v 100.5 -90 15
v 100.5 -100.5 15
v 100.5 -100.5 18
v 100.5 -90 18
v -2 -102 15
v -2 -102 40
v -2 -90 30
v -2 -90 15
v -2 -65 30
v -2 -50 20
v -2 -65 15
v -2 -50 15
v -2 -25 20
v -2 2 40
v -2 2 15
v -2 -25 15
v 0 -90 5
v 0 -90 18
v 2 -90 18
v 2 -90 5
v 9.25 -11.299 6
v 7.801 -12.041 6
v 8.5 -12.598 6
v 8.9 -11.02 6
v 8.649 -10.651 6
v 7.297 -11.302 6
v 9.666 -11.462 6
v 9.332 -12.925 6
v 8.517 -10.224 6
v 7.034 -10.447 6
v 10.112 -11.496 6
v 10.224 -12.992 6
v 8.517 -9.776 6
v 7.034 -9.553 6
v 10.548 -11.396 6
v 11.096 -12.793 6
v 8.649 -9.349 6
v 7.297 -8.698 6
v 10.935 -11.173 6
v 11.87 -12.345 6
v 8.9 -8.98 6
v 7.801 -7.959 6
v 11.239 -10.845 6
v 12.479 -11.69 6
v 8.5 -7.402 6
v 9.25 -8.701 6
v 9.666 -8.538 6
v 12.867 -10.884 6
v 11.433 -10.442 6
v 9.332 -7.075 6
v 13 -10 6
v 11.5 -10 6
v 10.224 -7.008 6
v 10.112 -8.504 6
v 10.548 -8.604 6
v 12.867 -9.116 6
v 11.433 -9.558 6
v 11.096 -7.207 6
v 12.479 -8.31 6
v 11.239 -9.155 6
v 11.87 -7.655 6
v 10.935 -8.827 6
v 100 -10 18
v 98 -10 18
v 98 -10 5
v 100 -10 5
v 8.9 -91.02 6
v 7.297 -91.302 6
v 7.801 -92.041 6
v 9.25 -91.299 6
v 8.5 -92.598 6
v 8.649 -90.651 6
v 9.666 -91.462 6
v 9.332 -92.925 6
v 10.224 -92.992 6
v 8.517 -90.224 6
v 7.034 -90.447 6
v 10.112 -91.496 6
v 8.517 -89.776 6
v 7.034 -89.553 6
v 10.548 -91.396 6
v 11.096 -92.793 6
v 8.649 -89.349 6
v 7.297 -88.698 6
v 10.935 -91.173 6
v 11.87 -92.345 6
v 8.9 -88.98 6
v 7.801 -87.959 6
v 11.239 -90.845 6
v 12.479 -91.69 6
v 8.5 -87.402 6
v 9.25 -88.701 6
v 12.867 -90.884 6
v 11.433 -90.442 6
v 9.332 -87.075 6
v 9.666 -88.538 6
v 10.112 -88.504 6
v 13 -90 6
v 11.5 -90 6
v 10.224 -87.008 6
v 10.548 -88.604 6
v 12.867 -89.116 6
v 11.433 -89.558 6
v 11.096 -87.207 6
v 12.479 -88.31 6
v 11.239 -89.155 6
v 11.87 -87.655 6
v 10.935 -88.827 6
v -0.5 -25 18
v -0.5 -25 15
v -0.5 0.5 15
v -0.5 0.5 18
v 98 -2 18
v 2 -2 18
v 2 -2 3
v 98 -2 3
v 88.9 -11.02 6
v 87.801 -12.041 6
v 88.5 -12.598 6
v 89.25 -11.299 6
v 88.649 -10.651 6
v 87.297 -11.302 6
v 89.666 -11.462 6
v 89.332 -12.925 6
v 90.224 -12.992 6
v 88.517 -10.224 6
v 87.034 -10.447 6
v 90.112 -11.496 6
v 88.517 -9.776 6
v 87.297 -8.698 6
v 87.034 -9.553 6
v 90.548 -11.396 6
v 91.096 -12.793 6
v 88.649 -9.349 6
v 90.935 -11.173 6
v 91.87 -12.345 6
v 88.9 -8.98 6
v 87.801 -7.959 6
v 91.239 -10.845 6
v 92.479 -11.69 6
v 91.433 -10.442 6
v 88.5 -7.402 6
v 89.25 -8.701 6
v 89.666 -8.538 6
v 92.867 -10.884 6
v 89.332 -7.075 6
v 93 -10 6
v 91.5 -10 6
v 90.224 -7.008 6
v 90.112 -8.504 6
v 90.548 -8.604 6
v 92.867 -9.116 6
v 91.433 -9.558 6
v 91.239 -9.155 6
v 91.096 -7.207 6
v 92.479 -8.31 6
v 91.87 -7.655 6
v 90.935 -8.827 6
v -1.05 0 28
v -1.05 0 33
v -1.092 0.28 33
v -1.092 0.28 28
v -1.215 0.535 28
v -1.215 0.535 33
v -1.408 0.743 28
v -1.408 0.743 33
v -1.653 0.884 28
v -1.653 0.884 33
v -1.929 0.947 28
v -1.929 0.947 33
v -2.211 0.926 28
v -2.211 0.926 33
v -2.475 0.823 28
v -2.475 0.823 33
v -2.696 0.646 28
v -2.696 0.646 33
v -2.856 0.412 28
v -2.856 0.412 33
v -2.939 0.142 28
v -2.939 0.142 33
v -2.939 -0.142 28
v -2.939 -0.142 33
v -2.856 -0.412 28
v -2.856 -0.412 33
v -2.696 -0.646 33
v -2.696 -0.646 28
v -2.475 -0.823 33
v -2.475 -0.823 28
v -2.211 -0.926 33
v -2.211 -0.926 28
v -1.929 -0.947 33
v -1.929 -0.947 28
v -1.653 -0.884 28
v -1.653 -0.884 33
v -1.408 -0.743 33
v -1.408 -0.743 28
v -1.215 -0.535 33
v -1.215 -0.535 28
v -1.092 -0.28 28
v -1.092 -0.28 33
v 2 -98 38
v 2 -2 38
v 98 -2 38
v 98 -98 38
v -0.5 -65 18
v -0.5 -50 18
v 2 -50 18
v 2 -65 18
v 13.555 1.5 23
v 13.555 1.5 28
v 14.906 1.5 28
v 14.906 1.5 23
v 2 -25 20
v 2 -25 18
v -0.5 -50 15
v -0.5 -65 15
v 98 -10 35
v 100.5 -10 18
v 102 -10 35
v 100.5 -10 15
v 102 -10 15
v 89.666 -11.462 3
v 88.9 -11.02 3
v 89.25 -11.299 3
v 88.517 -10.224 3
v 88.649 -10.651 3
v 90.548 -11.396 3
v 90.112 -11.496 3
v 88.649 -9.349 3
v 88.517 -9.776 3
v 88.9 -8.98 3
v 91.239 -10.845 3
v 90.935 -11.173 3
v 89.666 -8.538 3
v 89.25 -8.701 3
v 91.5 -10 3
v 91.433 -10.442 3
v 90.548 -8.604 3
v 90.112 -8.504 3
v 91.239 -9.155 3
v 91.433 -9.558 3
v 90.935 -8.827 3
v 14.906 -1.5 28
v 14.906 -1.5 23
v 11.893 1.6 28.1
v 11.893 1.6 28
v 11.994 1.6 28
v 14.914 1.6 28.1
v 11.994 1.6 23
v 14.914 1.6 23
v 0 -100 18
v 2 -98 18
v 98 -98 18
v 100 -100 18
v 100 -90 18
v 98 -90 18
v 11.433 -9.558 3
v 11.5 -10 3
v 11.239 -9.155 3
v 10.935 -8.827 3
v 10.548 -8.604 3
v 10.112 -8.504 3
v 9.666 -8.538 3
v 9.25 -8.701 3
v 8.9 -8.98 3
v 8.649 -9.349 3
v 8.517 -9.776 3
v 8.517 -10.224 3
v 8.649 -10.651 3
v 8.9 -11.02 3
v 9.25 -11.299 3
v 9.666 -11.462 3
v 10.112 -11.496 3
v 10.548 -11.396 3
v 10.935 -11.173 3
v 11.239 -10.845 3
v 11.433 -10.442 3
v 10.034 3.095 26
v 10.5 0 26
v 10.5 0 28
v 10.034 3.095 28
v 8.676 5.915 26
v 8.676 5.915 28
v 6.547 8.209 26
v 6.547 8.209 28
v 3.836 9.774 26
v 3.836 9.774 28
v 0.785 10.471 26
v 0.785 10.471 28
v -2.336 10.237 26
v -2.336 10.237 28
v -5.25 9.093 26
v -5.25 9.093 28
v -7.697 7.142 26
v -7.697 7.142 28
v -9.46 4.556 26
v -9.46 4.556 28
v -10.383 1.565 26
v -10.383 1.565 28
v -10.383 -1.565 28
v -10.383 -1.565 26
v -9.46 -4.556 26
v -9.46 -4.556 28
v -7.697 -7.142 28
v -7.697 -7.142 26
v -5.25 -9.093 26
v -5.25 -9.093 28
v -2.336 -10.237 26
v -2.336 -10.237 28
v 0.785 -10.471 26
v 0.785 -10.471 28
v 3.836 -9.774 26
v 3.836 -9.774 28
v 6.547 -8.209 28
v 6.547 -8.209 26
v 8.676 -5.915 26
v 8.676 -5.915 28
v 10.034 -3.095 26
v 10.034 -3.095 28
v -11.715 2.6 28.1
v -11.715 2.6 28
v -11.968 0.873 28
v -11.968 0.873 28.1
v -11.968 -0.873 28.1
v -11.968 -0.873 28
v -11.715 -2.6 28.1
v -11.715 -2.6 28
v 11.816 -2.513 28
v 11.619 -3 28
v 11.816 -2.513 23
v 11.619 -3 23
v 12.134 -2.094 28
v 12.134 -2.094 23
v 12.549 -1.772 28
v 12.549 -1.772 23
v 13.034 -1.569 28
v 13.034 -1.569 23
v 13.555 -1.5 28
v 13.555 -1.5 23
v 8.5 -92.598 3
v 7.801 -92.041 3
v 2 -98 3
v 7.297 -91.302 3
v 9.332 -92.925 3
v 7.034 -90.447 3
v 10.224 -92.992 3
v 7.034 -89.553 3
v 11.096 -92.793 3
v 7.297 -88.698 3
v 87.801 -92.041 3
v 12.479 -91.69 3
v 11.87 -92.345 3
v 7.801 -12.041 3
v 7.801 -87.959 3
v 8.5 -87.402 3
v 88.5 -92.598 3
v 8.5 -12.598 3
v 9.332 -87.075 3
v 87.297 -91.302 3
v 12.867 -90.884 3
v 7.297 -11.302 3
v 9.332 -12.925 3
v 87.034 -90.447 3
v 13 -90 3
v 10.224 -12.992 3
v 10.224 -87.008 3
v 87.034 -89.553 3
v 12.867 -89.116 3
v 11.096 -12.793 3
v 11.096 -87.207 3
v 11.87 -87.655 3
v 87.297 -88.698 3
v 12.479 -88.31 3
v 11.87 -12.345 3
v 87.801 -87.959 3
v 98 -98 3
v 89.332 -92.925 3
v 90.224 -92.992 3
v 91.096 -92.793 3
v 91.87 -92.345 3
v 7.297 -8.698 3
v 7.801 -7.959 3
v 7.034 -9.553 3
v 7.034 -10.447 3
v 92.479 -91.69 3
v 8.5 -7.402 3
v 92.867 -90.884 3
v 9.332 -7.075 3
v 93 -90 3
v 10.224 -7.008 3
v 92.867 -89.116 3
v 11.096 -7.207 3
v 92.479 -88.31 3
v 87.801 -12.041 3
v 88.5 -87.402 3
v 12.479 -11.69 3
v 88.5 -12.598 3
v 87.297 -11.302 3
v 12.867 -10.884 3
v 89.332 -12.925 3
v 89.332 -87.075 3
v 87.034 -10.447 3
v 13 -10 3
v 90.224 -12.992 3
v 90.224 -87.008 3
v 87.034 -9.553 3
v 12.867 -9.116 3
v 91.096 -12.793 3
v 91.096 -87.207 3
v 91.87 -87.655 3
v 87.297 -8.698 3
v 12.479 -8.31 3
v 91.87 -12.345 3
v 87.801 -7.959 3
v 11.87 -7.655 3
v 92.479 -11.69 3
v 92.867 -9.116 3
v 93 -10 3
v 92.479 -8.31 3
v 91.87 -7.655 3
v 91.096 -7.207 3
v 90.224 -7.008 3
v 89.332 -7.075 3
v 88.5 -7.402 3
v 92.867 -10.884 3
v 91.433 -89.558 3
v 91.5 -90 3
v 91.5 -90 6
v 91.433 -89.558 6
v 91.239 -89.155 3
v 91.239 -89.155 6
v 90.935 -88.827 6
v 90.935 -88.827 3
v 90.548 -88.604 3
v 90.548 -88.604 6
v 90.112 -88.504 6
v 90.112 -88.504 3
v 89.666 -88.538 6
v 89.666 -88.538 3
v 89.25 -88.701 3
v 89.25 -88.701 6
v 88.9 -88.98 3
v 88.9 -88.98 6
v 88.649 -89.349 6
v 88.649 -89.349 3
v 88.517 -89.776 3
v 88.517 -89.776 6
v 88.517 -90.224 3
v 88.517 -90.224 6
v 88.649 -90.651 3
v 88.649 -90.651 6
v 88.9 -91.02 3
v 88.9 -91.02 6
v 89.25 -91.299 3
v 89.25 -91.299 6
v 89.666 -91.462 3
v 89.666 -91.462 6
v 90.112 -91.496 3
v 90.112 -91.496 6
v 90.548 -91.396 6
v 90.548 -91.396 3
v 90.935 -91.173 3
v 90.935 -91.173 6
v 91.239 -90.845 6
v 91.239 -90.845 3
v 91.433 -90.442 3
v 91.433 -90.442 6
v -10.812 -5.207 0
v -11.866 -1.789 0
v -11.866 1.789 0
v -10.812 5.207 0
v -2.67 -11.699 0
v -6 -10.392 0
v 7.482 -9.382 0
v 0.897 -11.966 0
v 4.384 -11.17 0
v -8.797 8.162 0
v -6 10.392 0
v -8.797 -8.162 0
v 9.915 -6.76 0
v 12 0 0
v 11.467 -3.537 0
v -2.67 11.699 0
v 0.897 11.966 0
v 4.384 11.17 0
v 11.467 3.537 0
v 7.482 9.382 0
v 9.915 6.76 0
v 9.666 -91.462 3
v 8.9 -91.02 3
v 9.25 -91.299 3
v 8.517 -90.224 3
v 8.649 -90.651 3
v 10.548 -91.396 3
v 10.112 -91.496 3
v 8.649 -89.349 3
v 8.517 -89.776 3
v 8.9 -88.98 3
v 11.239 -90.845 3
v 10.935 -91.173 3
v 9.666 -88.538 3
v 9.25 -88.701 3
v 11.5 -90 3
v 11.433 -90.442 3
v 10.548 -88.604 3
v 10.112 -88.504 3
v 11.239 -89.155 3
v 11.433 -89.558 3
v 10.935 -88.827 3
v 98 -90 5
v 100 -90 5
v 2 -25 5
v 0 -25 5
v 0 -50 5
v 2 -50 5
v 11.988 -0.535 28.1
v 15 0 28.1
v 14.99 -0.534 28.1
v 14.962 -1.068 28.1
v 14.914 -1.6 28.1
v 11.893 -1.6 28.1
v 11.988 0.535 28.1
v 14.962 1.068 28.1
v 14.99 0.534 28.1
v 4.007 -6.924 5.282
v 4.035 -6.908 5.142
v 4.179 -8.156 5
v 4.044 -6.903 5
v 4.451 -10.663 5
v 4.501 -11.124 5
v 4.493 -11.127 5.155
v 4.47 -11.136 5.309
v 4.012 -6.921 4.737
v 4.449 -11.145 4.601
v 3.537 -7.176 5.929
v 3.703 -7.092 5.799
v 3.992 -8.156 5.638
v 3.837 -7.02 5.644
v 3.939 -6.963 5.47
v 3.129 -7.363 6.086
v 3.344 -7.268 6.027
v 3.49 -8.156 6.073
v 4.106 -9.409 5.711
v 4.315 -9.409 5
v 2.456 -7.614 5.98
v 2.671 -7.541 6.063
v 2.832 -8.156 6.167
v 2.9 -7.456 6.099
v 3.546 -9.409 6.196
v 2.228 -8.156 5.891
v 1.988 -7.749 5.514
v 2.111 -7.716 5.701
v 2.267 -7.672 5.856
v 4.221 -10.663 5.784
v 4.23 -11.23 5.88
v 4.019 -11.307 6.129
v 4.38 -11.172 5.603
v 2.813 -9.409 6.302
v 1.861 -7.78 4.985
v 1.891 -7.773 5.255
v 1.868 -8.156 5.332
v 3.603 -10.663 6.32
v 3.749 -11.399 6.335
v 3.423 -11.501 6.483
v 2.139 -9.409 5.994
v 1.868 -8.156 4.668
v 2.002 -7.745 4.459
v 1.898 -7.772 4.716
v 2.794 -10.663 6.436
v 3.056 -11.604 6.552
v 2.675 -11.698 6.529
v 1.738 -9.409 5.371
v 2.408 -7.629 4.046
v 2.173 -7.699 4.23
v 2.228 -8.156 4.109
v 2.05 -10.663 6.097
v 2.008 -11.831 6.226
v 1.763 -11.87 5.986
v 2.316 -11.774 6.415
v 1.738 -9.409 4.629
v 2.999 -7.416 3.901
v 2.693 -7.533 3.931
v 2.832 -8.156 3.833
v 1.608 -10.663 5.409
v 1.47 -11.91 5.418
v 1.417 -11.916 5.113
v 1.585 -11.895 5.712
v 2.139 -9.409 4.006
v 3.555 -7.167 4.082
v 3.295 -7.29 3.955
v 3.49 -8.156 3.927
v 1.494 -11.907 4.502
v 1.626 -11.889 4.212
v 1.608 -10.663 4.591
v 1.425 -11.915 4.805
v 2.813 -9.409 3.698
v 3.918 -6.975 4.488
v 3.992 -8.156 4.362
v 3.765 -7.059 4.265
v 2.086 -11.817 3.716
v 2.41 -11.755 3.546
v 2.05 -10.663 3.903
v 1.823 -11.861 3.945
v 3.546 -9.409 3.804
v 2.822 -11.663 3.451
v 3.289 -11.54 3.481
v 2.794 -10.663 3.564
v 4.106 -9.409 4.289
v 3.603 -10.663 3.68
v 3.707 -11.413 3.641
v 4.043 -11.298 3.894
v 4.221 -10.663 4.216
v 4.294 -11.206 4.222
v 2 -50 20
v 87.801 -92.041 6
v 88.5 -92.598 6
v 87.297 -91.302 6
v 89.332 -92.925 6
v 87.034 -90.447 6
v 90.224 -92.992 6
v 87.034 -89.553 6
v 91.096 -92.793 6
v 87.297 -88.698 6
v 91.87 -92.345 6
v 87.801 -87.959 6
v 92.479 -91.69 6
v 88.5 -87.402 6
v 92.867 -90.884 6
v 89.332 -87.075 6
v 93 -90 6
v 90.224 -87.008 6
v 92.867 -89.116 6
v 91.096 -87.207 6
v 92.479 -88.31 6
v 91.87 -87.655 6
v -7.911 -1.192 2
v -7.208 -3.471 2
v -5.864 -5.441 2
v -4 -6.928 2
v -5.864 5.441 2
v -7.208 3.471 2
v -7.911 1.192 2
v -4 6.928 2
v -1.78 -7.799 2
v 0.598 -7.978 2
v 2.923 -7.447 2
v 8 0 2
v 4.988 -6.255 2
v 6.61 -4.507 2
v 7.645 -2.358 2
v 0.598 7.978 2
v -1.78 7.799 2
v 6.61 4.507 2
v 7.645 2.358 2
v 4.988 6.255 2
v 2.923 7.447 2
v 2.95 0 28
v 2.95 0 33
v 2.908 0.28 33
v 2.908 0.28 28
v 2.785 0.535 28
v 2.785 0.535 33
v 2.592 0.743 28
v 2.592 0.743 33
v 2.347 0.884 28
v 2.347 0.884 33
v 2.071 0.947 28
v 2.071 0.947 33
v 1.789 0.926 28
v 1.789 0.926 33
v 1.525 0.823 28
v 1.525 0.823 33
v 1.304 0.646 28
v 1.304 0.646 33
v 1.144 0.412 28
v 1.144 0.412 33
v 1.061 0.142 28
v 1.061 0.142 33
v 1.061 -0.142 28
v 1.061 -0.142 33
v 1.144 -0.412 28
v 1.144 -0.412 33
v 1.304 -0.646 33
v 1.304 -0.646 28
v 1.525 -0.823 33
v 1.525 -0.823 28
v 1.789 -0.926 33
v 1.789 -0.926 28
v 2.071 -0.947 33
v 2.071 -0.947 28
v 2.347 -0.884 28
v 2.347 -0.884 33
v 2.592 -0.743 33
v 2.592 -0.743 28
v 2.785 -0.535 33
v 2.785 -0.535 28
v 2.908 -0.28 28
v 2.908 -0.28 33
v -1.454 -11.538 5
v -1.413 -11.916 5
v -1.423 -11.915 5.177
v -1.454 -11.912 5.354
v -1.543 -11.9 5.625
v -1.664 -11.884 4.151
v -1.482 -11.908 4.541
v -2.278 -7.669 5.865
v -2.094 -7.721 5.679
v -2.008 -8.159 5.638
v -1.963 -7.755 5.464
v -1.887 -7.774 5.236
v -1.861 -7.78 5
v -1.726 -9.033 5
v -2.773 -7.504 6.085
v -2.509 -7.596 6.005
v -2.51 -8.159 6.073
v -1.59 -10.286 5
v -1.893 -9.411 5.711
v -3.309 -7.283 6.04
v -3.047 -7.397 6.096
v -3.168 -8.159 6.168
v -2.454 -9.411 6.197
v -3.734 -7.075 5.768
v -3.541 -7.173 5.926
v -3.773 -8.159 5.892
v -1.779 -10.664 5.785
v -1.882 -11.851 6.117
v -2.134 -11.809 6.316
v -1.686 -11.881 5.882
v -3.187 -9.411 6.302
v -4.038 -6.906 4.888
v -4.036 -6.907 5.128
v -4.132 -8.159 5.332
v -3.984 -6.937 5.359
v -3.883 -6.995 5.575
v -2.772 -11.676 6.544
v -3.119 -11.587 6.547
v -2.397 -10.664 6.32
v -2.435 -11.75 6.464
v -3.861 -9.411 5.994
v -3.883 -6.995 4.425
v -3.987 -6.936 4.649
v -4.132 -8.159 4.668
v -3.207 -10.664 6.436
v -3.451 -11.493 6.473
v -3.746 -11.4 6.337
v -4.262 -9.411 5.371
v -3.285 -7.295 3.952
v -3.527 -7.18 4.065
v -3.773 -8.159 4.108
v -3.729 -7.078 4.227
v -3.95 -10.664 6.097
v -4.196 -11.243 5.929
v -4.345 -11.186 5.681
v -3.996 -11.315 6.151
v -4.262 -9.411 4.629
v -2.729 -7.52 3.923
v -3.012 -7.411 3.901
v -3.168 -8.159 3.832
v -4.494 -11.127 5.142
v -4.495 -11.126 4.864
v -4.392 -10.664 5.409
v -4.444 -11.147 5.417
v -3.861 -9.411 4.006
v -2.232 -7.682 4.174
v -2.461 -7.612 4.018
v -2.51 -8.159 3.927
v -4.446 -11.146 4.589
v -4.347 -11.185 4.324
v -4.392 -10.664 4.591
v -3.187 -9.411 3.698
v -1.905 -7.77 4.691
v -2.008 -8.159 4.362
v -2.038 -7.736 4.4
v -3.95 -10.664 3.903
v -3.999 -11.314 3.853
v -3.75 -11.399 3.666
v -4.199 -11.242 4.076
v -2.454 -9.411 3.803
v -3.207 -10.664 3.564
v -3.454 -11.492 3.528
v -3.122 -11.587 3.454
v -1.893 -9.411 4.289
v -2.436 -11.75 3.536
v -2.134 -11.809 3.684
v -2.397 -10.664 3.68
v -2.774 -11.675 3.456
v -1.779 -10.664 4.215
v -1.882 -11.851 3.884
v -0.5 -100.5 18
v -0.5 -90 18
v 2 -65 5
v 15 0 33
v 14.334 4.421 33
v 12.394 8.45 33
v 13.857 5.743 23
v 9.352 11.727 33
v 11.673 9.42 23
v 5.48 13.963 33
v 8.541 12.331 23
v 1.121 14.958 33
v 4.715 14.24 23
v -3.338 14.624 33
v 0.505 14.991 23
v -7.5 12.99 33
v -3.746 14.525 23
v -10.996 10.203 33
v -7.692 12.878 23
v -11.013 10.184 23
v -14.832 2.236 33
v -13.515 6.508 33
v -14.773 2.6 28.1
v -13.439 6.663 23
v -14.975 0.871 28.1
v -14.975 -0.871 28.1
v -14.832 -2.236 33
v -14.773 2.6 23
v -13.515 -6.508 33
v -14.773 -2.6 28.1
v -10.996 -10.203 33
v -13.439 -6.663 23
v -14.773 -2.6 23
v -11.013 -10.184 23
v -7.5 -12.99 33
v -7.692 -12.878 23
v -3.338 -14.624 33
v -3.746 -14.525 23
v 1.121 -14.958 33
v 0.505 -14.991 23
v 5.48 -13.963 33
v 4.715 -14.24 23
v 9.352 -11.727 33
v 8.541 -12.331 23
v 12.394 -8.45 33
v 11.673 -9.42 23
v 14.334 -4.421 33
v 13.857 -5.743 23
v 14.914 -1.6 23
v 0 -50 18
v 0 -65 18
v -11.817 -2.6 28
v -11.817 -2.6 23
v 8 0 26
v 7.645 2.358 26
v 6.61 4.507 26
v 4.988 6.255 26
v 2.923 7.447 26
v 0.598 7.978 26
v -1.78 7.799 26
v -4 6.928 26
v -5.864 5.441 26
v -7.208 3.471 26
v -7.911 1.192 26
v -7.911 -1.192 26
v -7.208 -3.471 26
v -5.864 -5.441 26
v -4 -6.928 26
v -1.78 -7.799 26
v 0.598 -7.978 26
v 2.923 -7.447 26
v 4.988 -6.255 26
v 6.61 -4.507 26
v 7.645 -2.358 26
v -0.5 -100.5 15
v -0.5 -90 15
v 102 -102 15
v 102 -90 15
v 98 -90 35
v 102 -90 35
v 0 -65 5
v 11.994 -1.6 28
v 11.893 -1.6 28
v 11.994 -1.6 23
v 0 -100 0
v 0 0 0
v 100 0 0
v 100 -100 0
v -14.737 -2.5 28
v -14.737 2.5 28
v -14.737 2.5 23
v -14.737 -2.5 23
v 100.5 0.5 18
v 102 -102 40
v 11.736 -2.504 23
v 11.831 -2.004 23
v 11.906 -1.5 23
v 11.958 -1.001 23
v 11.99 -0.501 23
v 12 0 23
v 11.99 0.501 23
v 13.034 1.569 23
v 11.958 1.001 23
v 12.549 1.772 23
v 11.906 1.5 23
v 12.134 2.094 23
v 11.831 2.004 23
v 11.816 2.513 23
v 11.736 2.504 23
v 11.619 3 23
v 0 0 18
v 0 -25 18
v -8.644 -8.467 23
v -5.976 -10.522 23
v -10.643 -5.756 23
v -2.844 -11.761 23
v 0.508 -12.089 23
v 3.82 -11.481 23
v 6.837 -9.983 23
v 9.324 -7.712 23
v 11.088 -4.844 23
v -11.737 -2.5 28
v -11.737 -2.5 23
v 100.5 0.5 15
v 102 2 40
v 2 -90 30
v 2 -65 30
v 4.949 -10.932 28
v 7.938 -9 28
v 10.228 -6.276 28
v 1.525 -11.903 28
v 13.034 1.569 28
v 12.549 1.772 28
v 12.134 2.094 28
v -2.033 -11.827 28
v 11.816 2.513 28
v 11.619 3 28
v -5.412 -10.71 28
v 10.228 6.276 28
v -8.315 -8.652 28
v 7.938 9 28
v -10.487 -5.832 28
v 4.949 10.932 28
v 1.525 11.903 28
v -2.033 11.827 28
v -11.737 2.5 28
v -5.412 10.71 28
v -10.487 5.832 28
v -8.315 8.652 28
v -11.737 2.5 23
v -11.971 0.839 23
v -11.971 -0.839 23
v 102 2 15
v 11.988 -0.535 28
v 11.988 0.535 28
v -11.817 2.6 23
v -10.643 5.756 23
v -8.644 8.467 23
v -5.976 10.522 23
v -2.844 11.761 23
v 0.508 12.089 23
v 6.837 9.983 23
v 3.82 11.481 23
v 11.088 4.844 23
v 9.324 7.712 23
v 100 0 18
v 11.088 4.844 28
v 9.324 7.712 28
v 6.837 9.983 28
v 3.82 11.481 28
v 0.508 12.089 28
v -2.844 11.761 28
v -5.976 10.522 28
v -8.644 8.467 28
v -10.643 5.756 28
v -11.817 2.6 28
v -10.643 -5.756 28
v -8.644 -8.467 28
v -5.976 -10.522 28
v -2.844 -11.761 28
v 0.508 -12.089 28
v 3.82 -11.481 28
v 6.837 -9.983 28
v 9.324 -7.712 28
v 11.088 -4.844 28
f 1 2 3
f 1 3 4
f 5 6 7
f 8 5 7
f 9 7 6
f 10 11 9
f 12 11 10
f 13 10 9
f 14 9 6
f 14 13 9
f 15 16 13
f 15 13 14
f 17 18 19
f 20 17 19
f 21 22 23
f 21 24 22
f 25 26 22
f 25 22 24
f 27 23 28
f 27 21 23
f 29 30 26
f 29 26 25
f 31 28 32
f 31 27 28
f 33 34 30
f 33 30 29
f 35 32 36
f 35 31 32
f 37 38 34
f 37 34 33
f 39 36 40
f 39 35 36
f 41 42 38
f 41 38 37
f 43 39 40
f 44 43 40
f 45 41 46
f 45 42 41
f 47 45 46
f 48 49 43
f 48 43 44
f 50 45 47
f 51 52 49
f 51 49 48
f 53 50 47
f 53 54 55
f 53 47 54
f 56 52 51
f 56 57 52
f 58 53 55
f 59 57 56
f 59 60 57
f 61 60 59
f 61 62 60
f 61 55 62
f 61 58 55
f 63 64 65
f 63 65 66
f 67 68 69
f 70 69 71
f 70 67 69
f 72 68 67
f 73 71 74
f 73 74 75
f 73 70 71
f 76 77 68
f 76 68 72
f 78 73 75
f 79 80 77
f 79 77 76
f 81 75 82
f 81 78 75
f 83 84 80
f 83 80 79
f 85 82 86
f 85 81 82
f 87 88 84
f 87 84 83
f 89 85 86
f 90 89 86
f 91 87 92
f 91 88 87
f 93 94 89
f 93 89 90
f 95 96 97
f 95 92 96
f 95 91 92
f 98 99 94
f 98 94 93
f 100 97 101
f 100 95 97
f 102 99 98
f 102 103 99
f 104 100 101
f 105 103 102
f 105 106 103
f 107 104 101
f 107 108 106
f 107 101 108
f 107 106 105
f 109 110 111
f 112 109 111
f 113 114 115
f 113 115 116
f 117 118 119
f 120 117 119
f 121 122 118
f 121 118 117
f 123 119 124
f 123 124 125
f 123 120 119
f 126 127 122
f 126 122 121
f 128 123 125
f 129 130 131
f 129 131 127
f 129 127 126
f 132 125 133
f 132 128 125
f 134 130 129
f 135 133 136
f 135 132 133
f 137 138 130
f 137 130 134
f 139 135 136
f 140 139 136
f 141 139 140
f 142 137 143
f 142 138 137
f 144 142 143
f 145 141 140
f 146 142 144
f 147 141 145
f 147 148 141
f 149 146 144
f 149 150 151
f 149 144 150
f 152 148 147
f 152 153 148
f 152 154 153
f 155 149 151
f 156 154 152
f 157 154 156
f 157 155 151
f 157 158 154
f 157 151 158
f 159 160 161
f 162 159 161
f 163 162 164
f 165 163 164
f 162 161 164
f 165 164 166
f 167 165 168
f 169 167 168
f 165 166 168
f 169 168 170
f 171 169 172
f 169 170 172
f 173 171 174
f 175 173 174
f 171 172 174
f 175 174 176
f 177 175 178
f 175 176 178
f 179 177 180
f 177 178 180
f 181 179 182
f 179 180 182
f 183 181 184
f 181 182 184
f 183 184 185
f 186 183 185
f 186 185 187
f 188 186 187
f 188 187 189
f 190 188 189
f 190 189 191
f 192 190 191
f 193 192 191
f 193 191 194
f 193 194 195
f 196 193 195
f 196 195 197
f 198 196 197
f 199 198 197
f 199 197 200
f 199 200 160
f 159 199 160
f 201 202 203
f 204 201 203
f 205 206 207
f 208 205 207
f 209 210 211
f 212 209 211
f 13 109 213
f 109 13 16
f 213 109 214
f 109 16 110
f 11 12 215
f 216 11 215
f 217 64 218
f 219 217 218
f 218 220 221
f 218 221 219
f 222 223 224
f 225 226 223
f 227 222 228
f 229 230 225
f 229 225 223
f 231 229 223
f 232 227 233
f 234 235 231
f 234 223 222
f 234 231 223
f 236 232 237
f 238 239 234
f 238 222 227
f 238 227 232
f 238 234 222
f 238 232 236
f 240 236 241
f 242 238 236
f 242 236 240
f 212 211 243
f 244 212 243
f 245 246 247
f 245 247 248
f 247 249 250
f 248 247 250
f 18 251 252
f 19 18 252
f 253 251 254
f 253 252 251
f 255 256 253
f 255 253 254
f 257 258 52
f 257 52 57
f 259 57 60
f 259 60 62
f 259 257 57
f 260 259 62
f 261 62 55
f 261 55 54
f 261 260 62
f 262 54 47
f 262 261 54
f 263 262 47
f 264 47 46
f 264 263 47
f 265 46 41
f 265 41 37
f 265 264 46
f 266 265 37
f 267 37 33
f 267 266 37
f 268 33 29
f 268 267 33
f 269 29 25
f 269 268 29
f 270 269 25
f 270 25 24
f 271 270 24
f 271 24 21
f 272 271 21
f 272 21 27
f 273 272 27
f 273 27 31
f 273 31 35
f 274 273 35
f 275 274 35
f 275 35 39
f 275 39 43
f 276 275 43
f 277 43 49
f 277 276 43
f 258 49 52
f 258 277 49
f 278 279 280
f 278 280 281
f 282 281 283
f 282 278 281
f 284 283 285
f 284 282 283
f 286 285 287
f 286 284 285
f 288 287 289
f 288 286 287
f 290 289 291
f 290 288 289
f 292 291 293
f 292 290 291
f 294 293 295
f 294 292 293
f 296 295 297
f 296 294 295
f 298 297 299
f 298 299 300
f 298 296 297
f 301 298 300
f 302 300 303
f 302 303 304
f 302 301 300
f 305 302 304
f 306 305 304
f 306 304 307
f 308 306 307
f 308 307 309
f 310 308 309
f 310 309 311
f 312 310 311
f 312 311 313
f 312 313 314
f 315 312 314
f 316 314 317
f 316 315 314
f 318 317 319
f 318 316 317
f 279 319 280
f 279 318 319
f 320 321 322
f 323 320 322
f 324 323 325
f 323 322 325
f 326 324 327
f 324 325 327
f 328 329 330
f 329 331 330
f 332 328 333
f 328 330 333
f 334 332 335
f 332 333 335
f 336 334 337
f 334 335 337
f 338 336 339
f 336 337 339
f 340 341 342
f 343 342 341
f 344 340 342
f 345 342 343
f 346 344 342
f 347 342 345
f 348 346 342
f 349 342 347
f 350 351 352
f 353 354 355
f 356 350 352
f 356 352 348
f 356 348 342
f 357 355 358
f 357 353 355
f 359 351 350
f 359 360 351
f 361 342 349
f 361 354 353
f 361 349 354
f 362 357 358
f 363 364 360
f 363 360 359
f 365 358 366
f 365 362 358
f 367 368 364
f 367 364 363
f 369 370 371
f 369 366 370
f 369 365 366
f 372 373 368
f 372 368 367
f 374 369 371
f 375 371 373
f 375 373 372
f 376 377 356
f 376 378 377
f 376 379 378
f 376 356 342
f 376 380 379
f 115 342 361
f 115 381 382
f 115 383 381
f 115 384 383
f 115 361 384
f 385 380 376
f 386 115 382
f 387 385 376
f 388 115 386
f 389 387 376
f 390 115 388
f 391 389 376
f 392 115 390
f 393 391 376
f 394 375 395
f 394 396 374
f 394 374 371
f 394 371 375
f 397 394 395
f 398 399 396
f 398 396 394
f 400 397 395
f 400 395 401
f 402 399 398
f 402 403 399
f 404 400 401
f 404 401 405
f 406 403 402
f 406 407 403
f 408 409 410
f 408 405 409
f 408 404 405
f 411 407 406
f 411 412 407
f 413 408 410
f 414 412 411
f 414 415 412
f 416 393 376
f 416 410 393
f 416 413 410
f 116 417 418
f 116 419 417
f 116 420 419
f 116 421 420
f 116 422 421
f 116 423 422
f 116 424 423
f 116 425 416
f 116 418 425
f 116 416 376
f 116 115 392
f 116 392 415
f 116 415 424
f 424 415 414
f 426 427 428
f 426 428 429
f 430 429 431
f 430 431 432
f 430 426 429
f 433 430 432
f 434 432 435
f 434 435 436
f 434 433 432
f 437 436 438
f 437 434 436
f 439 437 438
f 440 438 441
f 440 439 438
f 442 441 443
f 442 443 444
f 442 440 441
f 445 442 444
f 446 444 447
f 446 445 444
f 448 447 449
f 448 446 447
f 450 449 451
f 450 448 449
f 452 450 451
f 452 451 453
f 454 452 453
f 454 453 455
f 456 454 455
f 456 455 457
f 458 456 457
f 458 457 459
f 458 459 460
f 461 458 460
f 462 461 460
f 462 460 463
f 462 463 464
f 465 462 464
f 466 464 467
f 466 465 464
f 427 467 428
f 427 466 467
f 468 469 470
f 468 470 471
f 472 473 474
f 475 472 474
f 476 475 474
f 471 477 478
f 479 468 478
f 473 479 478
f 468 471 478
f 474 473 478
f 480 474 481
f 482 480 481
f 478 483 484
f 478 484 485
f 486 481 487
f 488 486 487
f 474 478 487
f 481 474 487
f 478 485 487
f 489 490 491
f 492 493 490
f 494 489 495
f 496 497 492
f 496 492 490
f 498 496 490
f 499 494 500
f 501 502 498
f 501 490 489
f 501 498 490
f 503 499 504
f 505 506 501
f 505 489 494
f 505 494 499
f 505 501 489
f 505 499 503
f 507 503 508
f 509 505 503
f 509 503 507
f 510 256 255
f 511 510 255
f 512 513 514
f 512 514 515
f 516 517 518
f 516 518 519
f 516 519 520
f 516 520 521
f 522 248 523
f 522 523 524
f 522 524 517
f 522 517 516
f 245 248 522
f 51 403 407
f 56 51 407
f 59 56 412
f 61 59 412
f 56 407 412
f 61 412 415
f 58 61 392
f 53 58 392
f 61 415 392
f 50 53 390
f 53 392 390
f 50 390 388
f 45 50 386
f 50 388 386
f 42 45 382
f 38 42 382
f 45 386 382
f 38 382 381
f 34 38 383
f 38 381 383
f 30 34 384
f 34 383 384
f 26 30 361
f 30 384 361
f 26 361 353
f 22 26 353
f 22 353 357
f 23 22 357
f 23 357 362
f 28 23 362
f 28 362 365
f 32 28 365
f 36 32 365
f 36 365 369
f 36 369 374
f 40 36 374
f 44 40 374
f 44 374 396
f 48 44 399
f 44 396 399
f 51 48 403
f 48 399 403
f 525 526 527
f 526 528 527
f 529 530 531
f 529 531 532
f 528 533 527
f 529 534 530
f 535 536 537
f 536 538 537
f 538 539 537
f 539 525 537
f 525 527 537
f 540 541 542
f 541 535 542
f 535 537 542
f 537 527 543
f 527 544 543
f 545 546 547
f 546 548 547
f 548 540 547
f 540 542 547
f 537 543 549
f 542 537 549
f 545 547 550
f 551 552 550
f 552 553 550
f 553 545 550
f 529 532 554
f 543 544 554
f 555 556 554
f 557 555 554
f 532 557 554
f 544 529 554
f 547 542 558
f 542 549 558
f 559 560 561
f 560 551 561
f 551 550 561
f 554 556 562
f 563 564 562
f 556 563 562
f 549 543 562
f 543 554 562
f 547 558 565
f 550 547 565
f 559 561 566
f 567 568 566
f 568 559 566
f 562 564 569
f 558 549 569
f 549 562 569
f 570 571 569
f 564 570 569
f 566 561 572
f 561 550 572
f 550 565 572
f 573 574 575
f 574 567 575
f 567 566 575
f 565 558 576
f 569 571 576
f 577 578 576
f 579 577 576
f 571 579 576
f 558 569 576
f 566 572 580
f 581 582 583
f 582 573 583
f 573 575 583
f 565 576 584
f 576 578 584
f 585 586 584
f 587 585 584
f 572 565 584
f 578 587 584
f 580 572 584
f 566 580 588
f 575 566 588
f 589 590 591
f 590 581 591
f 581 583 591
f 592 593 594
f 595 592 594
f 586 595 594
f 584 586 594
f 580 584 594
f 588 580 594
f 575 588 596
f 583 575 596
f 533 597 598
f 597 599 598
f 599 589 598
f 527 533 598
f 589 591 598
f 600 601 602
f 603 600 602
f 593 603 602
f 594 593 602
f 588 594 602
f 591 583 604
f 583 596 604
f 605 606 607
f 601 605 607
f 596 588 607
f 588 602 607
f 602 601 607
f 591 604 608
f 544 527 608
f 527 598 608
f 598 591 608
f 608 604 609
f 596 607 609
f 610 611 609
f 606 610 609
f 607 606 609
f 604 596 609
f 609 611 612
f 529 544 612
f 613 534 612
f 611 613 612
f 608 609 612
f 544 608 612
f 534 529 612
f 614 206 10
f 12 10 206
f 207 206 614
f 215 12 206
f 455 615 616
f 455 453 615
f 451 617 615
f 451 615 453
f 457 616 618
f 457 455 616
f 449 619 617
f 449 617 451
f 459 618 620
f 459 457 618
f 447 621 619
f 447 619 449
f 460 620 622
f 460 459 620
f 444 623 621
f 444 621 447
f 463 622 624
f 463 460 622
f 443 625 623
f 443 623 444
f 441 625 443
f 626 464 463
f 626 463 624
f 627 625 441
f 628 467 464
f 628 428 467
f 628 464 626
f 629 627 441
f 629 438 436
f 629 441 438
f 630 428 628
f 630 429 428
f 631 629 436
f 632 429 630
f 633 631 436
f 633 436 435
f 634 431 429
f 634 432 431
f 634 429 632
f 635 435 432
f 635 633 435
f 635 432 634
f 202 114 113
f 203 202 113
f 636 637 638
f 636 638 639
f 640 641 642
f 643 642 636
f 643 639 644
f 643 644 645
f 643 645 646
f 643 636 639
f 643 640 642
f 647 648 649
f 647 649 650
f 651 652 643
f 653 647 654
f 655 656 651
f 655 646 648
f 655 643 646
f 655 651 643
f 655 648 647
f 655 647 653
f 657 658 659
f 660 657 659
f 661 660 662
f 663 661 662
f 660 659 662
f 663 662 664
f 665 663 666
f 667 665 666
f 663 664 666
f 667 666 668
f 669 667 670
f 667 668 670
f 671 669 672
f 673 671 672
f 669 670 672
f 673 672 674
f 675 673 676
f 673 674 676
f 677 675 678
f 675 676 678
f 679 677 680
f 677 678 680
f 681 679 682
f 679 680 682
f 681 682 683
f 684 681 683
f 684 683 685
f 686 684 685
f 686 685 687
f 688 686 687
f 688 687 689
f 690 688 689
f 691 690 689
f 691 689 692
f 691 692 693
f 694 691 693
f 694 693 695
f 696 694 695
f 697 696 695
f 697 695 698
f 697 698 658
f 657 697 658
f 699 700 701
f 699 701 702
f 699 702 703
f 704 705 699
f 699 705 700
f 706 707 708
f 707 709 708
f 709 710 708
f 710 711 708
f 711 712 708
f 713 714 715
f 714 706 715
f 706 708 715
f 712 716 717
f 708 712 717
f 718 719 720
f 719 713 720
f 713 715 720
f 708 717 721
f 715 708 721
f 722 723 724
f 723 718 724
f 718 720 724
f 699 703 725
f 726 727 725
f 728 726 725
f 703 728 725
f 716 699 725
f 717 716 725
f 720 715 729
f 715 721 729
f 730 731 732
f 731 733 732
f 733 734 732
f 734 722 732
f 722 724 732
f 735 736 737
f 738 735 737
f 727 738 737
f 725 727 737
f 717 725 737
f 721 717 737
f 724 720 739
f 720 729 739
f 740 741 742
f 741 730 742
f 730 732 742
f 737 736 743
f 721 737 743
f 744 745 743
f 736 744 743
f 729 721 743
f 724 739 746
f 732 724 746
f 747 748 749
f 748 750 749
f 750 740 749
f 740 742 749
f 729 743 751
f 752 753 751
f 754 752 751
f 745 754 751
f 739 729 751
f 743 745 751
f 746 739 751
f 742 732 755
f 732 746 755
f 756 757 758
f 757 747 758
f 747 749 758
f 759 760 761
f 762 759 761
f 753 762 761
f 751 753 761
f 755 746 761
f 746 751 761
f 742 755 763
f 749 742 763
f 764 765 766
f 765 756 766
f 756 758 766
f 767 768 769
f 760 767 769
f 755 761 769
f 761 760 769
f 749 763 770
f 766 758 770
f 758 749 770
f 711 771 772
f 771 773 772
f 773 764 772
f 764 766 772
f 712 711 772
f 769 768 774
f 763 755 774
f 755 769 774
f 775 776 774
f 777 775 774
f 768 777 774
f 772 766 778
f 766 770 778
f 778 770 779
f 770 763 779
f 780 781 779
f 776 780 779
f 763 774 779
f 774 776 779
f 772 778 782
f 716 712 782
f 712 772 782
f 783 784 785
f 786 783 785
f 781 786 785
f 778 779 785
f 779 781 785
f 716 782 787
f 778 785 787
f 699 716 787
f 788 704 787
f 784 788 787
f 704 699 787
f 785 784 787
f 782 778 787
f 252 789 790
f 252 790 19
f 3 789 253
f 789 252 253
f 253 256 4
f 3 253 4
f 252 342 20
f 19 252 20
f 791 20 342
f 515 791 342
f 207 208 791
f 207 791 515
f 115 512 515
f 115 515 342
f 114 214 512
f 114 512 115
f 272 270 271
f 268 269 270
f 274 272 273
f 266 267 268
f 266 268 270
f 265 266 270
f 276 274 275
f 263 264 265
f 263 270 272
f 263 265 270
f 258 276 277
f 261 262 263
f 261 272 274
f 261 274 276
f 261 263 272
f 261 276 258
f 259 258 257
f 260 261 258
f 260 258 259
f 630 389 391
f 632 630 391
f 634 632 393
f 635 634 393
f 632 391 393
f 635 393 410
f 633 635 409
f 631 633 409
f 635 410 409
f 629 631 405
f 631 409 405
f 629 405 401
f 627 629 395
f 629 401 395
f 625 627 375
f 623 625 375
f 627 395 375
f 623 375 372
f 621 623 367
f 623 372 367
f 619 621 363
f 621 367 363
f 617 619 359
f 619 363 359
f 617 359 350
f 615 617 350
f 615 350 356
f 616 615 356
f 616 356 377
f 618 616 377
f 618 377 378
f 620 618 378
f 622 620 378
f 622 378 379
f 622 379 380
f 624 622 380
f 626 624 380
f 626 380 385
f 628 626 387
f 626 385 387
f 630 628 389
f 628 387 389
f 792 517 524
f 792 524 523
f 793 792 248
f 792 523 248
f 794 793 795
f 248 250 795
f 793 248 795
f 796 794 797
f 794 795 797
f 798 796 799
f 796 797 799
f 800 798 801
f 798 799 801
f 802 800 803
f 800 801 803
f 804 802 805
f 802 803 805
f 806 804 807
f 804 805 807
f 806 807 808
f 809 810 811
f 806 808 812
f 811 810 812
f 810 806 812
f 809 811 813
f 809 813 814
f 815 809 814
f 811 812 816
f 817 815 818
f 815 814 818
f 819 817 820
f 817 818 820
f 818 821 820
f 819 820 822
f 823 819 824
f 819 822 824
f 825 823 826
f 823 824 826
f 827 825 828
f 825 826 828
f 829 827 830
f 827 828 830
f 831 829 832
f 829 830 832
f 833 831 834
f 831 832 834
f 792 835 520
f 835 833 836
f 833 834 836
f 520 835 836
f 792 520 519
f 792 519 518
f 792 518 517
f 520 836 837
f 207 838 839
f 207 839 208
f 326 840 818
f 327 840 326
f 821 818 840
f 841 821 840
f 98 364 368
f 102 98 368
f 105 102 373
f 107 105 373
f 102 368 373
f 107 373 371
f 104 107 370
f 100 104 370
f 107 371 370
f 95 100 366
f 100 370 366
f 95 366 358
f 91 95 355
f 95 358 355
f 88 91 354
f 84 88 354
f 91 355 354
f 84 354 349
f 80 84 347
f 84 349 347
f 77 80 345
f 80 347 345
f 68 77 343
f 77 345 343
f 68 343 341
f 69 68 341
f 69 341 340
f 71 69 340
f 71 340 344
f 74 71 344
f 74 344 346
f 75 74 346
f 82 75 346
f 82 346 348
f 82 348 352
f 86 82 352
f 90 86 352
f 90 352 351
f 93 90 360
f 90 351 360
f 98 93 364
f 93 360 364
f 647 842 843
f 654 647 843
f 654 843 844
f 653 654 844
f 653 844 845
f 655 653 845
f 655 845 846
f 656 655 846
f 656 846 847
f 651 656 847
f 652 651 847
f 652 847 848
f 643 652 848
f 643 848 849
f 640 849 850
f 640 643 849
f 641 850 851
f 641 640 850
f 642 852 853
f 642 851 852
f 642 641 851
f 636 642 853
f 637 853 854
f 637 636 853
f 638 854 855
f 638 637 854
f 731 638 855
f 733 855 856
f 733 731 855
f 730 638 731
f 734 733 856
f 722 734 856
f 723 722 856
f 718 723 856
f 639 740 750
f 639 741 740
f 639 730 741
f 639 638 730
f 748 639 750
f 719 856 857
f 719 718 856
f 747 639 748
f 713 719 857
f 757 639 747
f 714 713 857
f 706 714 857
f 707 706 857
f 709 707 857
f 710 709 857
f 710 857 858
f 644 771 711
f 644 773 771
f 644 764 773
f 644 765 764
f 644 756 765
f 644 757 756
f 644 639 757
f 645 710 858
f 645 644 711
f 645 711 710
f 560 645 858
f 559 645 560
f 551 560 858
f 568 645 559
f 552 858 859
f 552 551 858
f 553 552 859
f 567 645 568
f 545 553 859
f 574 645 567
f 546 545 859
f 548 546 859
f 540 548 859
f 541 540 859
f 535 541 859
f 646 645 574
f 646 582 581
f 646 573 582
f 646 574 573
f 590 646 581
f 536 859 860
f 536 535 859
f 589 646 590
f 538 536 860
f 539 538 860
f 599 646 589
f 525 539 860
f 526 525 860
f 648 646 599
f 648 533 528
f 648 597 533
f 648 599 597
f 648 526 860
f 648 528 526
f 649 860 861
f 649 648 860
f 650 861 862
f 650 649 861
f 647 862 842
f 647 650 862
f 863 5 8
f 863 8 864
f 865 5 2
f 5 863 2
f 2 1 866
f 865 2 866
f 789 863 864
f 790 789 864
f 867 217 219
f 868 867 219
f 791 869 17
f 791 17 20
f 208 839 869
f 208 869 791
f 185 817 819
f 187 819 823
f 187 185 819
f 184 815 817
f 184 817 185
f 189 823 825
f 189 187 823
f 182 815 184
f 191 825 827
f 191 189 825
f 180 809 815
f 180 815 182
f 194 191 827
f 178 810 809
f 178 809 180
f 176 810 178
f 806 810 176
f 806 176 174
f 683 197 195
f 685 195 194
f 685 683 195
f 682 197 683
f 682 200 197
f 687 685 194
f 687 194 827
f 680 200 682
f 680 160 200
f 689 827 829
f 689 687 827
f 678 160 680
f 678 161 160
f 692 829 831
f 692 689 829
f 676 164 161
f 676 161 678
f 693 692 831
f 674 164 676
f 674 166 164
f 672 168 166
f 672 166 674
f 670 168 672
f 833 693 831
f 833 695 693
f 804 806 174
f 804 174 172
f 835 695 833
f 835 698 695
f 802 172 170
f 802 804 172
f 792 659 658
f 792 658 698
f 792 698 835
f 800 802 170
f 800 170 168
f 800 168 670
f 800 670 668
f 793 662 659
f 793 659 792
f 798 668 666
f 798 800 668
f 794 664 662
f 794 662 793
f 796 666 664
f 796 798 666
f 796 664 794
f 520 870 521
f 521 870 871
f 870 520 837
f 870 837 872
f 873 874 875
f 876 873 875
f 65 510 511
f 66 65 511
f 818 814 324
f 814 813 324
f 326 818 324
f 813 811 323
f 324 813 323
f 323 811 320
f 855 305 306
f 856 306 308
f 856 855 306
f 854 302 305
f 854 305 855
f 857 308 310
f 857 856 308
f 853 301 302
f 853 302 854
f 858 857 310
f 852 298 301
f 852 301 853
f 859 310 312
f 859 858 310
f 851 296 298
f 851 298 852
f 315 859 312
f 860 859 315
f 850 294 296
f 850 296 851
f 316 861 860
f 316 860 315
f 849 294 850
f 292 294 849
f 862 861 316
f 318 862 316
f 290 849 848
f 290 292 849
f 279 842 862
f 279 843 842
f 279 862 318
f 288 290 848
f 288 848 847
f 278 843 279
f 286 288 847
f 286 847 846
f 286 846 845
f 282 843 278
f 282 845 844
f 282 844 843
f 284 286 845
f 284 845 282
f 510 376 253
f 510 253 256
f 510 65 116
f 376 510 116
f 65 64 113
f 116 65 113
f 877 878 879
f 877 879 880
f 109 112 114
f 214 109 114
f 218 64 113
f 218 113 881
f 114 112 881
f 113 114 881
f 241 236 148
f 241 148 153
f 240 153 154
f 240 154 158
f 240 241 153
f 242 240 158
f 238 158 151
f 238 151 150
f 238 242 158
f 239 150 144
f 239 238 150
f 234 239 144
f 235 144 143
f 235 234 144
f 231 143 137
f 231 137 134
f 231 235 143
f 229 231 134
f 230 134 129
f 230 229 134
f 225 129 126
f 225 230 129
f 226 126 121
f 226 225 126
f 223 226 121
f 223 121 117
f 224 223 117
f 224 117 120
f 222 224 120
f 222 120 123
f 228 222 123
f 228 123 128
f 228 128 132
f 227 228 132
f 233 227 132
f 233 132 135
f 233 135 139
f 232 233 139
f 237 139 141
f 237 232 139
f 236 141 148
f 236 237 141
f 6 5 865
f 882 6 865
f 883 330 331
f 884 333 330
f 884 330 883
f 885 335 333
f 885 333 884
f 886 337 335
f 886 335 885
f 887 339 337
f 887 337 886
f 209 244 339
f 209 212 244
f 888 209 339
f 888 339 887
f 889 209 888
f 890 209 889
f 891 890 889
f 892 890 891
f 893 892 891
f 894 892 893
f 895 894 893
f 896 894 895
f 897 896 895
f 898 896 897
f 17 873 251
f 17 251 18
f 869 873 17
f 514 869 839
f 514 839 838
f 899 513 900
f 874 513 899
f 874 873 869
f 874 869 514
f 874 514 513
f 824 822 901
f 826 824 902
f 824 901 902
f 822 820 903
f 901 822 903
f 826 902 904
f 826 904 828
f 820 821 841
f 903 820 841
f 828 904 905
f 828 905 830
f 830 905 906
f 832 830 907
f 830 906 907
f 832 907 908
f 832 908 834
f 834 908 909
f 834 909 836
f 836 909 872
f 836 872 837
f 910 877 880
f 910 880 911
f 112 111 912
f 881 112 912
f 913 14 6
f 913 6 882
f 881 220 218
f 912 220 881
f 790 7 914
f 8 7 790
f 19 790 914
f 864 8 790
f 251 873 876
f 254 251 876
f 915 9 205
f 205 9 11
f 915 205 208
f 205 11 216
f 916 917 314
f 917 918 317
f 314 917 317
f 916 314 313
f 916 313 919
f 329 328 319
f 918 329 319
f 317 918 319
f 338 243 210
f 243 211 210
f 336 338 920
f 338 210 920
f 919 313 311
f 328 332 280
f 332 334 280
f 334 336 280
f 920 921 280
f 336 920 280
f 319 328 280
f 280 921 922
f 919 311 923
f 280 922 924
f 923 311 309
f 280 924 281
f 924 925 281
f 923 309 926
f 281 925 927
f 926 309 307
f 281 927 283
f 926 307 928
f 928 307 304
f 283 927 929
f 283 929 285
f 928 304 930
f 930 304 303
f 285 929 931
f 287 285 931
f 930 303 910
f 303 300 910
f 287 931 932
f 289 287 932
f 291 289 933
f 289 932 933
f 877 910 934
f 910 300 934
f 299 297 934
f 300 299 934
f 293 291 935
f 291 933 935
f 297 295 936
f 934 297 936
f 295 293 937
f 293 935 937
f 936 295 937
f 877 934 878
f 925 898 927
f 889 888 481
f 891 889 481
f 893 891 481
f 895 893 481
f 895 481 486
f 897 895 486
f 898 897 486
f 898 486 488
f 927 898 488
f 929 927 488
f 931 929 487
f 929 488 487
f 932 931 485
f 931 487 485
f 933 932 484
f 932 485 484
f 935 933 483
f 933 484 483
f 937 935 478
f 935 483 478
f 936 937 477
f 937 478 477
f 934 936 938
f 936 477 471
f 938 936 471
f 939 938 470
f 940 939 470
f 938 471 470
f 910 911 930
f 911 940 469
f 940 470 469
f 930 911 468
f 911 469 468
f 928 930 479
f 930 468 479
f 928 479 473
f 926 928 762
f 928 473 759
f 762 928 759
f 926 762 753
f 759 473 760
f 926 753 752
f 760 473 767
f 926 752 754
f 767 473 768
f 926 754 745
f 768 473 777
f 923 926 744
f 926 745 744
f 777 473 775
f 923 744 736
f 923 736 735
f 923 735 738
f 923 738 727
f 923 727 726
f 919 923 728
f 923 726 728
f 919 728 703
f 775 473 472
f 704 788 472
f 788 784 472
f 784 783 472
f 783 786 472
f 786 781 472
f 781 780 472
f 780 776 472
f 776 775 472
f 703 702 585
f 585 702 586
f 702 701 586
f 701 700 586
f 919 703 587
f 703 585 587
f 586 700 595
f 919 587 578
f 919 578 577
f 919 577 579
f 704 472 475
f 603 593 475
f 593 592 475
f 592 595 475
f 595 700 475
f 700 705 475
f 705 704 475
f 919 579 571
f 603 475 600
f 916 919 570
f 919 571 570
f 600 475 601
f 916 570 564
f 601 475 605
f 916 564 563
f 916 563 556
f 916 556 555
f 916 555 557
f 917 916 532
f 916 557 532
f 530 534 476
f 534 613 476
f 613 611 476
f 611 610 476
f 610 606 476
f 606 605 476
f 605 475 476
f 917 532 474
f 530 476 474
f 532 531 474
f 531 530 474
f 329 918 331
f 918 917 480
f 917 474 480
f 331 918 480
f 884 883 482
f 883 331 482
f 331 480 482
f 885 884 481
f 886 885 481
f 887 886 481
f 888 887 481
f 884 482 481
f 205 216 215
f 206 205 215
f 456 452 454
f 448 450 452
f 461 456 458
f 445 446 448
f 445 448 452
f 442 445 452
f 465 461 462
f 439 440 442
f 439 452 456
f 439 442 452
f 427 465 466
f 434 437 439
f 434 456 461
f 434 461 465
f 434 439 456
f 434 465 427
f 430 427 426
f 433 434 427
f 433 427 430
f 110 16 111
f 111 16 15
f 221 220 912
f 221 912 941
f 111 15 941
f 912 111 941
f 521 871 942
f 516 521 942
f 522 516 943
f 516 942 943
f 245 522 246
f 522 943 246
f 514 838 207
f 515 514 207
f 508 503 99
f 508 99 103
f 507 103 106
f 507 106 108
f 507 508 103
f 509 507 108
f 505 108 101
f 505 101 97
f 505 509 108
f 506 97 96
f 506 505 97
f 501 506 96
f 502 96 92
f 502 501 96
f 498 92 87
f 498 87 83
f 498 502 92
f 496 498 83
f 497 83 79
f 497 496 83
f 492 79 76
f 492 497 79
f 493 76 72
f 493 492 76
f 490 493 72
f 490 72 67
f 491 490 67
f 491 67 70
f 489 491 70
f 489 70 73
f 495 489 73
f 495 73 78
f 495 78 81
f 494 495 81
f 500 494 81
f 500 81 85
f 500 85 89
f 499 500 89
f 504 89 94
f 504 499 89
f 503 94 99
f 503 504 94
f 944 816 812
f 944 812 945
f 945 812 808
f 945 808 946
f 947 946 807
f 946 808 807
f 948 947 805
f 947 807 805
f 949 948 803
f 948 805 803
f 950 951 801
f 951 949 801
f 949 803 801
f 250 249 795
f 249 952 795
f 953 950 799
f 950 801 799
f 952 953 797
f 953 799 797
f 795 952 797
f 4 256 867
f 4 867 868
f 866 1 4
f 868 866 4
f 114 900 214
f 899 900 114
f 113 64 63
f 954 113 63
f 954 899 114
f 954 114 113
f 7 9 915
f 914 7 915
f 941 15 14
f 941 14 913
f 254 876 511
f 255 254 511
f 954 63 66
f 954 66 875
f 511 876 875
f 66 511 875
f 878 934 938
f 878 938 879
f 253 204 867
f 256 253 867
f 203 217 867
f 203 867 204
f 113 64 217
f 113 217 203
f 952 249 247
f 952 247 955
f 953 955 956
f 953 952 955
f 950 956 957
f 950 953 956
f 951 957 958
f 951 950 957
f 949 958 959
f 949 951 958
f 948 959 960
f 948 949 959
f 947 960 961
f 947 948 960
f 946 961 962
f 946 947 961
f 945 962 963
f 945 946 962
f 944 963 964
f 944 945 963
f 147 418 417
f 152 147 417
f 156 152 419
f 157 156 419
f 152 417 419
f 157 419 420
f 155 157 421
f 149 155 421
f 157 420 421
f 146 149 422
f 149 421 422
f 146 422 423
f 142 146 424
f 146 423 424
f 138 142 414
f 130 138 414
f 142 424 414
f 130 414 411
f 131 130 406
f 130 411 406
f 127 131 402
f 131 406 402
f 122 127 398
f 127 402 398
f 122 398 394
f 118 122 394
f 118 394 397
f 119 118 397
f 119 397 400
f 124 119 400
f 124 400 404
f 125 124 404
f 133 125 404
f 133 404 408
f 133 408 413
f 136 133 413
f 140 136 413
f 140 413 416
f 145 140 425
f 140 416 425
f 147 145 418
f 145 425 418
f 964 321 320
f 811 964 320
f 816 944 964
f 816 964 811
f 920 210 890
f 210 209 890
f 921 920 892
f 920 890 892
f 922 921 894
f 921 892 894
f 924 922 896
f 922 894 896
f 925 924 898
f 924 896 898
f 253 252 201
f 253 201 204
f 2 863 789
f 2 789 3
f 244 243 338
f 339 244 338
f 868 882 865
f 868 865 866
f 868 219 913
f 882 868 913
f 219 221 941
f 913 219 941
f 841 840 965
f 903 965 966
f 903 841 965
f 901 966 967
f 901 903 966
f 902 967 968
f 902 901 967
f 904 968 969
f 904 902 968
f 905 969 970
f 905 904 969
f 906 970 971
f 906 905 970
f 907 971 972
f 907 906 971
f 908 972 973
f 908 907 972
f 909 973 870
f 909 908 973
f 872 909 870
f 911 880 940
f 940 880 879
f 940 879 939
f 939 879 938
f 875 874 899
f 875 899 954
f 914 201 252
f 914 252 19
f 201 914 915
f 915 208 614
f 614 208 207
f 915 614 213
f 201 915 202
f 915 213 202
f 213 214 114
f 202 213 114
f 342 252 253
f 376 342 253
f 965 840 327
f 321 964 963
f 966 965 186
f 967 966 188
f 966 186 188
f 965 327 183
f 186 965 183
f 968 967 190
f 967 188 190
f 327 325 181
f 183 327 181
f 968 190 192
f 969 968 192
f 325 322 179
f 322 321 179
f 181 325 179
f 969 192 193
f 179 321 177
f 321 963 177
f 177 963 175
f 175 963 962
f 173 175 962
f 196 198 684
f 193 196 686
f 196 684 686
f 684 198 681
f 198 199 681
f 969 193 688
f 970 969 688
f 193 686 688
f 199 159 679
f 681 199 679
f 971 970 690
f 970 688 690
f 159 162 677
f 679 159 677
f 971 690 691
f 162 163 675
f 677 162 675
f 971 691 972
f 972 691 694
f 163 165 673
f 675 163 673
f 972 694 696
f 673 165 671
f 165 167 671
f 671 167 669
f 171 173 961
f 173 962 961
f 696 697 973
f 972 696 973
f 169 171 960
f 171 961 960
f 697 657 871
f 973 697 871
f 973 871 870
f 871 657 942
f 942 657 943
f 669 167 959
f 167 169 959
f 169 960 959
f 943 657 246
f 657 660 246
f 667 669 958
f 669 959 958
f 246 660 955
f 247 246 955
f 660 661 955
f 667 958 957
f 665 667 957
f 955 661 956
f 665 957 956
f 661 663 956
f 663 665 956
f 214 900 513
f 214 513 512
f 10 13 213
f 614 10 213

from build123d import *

# Parameters (mm, degrees)
SKETCH_W        = 100
SKETCH_H        = 100
PAD_DEPTH       = 18
SKETCH001_W     = 96
SKETCH001_H     = 96
POCKET_DEPTH    = 15
SKETCH002_R     = 3
SKETCH002_R_2   = 1.5
PAD001_DEPTH    = 3
SKETCH003_W     = 2
SKETCH003_H     = 25
SKETCH003_H_2   = 80
POCKET002_DEPTH = 13
SKETCH014_W     = 104
SKETCH014_H     = 104
PAD005_DEPTH    = 25
SKETCH015_W     = 101
SKETCH015_H     = 101
POCKET009_DEPTH = 3
SKETCH016_W     = 96
SKETCH016_H     = 96
POCKET010_DEPTH = 20
SKETCH017_W     = 4
SKETCH017_H     = 25
POCKET011_DEPTH = 15
SKETCH018_W     = 4
SKETCH018_H     = 25
POCKET012_DEPTH = 25
SKETCH019_W     = 4
SKETCH019_H     = 80
POCKET013_DEPTH = 30
SKETCH009_R     = 15
PAD004_DEPTH    = 10
SKETCH010_R     = 12.1
POCKET006_DEPTH = 5
POCKET007_DEPTH = 5.1
SKETCH012_R     = 0.95
POCKET008_DEPTH = 10
SKETCH021_R     = 1
SKETCH022_R     = 1.65
SKETCH007_R     = 1
SKETCH020_R     = 1.65
SKETCH004_R     = 12
PAD002_DEPTH    = 28
SKETCH005_R     = 8
POCKET003_DEPTH = 26
SKETCH006_R     = 10.5
POCKET004_DEPTH = 2
PAD003_DEPTH    = 5
FILLET_R        = 2
FILLET001_R     = 2


with BuildPart() as case_bottom:
    # Sketch → Pad (new body)
    with BuildSketch(Plane.XY):
        with Locations((50, -50)):
            Rectangle(SKETCH_W, SKETCH_H)
    extrude(amount=PAD_DEPTH)

    # Sketch001 → Pocket (cut)
    with BuildSketch(Plane.XY.offset(18)):
        with Locations((50, -50)):
            Rectangle(SKETCH001_W, SKETCH001_H)
    extrude(amount=-POCKET_DEPTH, mode=Mode.SUBTRACT)

    # Sketch002 → Pad001 (join)
    with BuildSketch(Plane.XY.offset(3)):
        with Locations((10, -10)):
            Circle(SKETCH002_R)
        with Locations((10, -10)):
            Circle(SKETCH002_R_2, mode=Mode.SUBTRACT)
        with Locations((90, -10)):
            Circle(SKETCH002_R)
        with Locations((90, -10)):
            Circle(SKETCH002_R_2, mode=Mode.SUBTRACT)
        with Locations((90, -90)):
            Circle(SKETCH002_R)
        with Locations((90, -90)):
            Circle(SKETCH002_R_2, mode=Mode.SUBTRACT)
        with Locations((10, -90)):
            Circle(SKETCH002_R)
        with Locations((10, -90)):
            Circle(SKETCH002_R_2, mode=Mode.SUBTRACT)
    extrude(amount=PAD001_DEPTH)

    # Sketch003 → Pocket002 (cut)
    with BuildSketch(Plane.XY.offset(18)):
        with Locations((1, -77.5)):
            Rectangle(SKETCH003_W, SKETCH003_H)
        with Locations((1, -37.5)):
            Rectangle(SKETCH003_W, SKETCH003_H)
        with Locations((99, -50)):
            Rectangle(SKETCH003_W, SKETCH003_H_2)
    extrude(amount=-POCKET002_DEPTH, mode=Mode.SUBTRACT)


with BuildPart() as case_top:
    # Sketch014 → Pad005 (new body)
    with BuildSketch(Plane.XY.offset(15)):
        with Locations((50, -50)):
            Rectangle(SKETCH014_W, SKETCH014_H)
    extrude(amount=PAD005_DEPTH)

    # Sketch015 → Pocket009 (cut)
    with BuildSketch(Plane.XY.offset(15)):
        with Locations((50, -50)):
            Rectangle(SKETCH015_W, SKETCH015_H)
    extrude(amount=POCKET009_DEPTH, mode=Mode.SUBTRACT)

    # Sketch016 → Pocket010 (cut)
    with BuildSketch(Plane.XY.offset(18)):
        with Locations((50, -50)):
            Rectangle(SKETCH016_W, SKETCH016_H)
    extrude(amount=POCKET010_DEPTH, mode=Mode.SUBTRACT)

    # Sketch017 → Pocket011 (cut)
    with BuildSketch(Plane.XY.offset(5)):
        with Locations((0, -37.5)):
            Rectangle(SKETCH017_W, SKETCH017_H)
    extrude(amount=POCKET011_DEPTH, mode=Mode.SUBTRACT)

    # Sketch018 → Pocket012 (cut)
    with BuildSketch(Plane.XY.offset(5)):
        with Locations((0, -77.5)):
            Rectangle(SKETCH018_W, SKETCH018_H)
    extrude(amount=POCKET012_DEPTH, mode=Mode.SUBTRACT)

    # Sketch019 → Pocket013 (cut)
    with BuildSketch(Plane.XY.offset(5)):
        with Locations((100, -50)):
            Rectangle(SKETCH019_W, SKETCH019_H)
    extrude(amount=POCKET013_DEPTH, mode=Mode.SUBTRACT)


with BuildPart() as transwell_top:
    # Sketch009 → Pad004 (new body)
    with BuildSketch(Plane.XY.offset(23)):
        Circle(SKETCH009_R)
    extrude(amount=PAD004_DEPTH)

    # Sketch010 → Pocket006 (cut)
    with BuildSketch(Plane.XY.offset(23)):
        Circle(SKETCH010_R)
    extrude(amount=POCKET006_DEPTH, mode=Mode.SUBTRACT)

    # Sketch011 → Pocket007 (cut)
    with BuildSketch(Plane.XY.offset(23)):
        with BuildLine():
            Line((-11.7149477165, 2.6), (-17.7149477165, 2.6))
            Line((-17.7149477165, 2.6), (-17.7149477165, -2.6))
            Line((-17.7149477165, -2.6), (-11.7149477165, -2.6))
            ThreePointArc((-11.7149477165, 2.6), (-12, 0), (-11.7149477165, -2.6))
        make_face()
        with BuildLine():
            Line((11.8928549979, 1.6), (17.8928549979, 1.6))
            Line((17.8928549979, 1.6), (17.8928549979, -1.6))
            Line((17.8928549979, -1.6), (11.8928549979, -1.6))
            ThreePointArc((11.8928549979, -1.6), (12, 0), (11.8928549979, 1.6))
        make_face()
    extrude(amount=POCKET007_DEPTH, mode=Mode.SUBTRACT)

    # Sketch012 → Pocket008 (cut)
    with BuildSketch(Plane.XY.offset(38)):
        with Locations((-2, 0)):
            Circle(SKETCH012_R)
        with Locations((2, 0)):
            Circle(SKETCH012_R)
    extrude(amount=-POCKET008_DEPTH, mode=Mode.SUBTRACT)


with BuildPart() as body005:
    # Sketch021 → AdditiveLoft001 section 0
    with BuildSketch(Plane(origin=(-6, 0, 0), x_dir=(1, 0, 0), z_dir=(0, -1, 0))):
        with Locations((3, 5)):
            Circle(SKETCH021_R)
    # Sketch022 → AdditiveLoft001 section 1
    with BuildSketch(Plane(origin=(-6, -6, 0), x_dir=(1, 0, 0), z_dir=(0, -1, 0))):
        with Locations((3, 5)):
            Circle(SKETCH022_R)
    loft()


with BuildPart() as electrodes:
    # Sketch007 → AdditiveLoft section 0
    with BuildSketch(Plane.XZ):
        with Locations((3, 5)):
            Circle(SKETCH007_R)
    # Sketch020 → AdditiveLoft section 1
    with BuildSketch(Plane.XZ.offset(6)):
        with Locations((3, 5)):
            Circle(SKETCH020_R)
    loft()

    # Compound: union Body005
    add(body005.part)


with BuildPart() as electrodes_1:
    # Compound placement: moved
    add(electrodes.part.moved(Location((0, -6.5, 0))))


with BuildPart() as transwell_bottom_unit:
    # Sketch004 → Pad002 (new body)
    with BuildSketch(Plane.XY):
        Circle(SKETCH004_R)
    extrude(amount=PAD002_DEPTH)

    # Sketch005 → Pocket003 (cut)
    with BuildSketch(Plane.XY.offset(2)):
        Circle(SKETCH005_R)
    extrude(amount=POCKET003_DEPTH, mode=Mode.SUBTRACT)

    # Sketch006 → Pocket004 (cut)
    with BuildSketch(Plane.XY.offset(26)):
        Circle(SKETCH006_R)
    extrude(amount=POCKET004_DEPTH, mode=Mode.SUBTRACT)

    # Sketch008 → Pad003 (join)
    with BuildSketch(Plane.XY.offset(28)):
        with BuildLine():
            Line((-11.7366945943, 2.5), (-14.7366945943, 2.5))
            Line((-14.7366945943, 2.5), (-14.7366945943, -2.5))
            Line((-14.7366945943, -2.5), (-11.7366945943, -2.5))
            ThreePointArc((-11.7366945943, 2.5), (-12, 0), (-11.7366945943, -2.5))
        make_face()
        with BuildLine():
            Line((11.9058808998, 1.5), (14.9058808998, 1.5))
            Line((14.9058808998, 1.5), (14.9058808998, -1.5))
            Line((14.9058808998, -1.5), (11.9058808998, -1.5))
            ThreePointArc((11.9058808998, -1.5), (12, 0), (11.9058808998, 1.5))
        make_face()
    extrude(amount=-PAD003_DEPTH)

    # Fillet
    fillet_edges = [transwell_bottom_unit.edges().sort_by_distance(p)[0] for p in [
        (12, 0, 11.5),
        (11.905881, 1.5, 25.5),
    ]]
    fillet(fillet_edges, radius=FILLET_R)

    # Fillet001
    fillet001_edges = [transwell_bottom_unit.edges().sort_by_distance(p)[0] for p in [
        (11.905881, -1.5, 25.5),
    ]]
    fillet(fillet001_edges, radius=FILLET001_R)

    # Cut: cut electrodes
    add(electrodes_1.part, mode=Mode.SUBTRACT)


solid = Compound([case_bottom.part, case_top.part, transwell_top.part, transwell_bottom_unit.part])
